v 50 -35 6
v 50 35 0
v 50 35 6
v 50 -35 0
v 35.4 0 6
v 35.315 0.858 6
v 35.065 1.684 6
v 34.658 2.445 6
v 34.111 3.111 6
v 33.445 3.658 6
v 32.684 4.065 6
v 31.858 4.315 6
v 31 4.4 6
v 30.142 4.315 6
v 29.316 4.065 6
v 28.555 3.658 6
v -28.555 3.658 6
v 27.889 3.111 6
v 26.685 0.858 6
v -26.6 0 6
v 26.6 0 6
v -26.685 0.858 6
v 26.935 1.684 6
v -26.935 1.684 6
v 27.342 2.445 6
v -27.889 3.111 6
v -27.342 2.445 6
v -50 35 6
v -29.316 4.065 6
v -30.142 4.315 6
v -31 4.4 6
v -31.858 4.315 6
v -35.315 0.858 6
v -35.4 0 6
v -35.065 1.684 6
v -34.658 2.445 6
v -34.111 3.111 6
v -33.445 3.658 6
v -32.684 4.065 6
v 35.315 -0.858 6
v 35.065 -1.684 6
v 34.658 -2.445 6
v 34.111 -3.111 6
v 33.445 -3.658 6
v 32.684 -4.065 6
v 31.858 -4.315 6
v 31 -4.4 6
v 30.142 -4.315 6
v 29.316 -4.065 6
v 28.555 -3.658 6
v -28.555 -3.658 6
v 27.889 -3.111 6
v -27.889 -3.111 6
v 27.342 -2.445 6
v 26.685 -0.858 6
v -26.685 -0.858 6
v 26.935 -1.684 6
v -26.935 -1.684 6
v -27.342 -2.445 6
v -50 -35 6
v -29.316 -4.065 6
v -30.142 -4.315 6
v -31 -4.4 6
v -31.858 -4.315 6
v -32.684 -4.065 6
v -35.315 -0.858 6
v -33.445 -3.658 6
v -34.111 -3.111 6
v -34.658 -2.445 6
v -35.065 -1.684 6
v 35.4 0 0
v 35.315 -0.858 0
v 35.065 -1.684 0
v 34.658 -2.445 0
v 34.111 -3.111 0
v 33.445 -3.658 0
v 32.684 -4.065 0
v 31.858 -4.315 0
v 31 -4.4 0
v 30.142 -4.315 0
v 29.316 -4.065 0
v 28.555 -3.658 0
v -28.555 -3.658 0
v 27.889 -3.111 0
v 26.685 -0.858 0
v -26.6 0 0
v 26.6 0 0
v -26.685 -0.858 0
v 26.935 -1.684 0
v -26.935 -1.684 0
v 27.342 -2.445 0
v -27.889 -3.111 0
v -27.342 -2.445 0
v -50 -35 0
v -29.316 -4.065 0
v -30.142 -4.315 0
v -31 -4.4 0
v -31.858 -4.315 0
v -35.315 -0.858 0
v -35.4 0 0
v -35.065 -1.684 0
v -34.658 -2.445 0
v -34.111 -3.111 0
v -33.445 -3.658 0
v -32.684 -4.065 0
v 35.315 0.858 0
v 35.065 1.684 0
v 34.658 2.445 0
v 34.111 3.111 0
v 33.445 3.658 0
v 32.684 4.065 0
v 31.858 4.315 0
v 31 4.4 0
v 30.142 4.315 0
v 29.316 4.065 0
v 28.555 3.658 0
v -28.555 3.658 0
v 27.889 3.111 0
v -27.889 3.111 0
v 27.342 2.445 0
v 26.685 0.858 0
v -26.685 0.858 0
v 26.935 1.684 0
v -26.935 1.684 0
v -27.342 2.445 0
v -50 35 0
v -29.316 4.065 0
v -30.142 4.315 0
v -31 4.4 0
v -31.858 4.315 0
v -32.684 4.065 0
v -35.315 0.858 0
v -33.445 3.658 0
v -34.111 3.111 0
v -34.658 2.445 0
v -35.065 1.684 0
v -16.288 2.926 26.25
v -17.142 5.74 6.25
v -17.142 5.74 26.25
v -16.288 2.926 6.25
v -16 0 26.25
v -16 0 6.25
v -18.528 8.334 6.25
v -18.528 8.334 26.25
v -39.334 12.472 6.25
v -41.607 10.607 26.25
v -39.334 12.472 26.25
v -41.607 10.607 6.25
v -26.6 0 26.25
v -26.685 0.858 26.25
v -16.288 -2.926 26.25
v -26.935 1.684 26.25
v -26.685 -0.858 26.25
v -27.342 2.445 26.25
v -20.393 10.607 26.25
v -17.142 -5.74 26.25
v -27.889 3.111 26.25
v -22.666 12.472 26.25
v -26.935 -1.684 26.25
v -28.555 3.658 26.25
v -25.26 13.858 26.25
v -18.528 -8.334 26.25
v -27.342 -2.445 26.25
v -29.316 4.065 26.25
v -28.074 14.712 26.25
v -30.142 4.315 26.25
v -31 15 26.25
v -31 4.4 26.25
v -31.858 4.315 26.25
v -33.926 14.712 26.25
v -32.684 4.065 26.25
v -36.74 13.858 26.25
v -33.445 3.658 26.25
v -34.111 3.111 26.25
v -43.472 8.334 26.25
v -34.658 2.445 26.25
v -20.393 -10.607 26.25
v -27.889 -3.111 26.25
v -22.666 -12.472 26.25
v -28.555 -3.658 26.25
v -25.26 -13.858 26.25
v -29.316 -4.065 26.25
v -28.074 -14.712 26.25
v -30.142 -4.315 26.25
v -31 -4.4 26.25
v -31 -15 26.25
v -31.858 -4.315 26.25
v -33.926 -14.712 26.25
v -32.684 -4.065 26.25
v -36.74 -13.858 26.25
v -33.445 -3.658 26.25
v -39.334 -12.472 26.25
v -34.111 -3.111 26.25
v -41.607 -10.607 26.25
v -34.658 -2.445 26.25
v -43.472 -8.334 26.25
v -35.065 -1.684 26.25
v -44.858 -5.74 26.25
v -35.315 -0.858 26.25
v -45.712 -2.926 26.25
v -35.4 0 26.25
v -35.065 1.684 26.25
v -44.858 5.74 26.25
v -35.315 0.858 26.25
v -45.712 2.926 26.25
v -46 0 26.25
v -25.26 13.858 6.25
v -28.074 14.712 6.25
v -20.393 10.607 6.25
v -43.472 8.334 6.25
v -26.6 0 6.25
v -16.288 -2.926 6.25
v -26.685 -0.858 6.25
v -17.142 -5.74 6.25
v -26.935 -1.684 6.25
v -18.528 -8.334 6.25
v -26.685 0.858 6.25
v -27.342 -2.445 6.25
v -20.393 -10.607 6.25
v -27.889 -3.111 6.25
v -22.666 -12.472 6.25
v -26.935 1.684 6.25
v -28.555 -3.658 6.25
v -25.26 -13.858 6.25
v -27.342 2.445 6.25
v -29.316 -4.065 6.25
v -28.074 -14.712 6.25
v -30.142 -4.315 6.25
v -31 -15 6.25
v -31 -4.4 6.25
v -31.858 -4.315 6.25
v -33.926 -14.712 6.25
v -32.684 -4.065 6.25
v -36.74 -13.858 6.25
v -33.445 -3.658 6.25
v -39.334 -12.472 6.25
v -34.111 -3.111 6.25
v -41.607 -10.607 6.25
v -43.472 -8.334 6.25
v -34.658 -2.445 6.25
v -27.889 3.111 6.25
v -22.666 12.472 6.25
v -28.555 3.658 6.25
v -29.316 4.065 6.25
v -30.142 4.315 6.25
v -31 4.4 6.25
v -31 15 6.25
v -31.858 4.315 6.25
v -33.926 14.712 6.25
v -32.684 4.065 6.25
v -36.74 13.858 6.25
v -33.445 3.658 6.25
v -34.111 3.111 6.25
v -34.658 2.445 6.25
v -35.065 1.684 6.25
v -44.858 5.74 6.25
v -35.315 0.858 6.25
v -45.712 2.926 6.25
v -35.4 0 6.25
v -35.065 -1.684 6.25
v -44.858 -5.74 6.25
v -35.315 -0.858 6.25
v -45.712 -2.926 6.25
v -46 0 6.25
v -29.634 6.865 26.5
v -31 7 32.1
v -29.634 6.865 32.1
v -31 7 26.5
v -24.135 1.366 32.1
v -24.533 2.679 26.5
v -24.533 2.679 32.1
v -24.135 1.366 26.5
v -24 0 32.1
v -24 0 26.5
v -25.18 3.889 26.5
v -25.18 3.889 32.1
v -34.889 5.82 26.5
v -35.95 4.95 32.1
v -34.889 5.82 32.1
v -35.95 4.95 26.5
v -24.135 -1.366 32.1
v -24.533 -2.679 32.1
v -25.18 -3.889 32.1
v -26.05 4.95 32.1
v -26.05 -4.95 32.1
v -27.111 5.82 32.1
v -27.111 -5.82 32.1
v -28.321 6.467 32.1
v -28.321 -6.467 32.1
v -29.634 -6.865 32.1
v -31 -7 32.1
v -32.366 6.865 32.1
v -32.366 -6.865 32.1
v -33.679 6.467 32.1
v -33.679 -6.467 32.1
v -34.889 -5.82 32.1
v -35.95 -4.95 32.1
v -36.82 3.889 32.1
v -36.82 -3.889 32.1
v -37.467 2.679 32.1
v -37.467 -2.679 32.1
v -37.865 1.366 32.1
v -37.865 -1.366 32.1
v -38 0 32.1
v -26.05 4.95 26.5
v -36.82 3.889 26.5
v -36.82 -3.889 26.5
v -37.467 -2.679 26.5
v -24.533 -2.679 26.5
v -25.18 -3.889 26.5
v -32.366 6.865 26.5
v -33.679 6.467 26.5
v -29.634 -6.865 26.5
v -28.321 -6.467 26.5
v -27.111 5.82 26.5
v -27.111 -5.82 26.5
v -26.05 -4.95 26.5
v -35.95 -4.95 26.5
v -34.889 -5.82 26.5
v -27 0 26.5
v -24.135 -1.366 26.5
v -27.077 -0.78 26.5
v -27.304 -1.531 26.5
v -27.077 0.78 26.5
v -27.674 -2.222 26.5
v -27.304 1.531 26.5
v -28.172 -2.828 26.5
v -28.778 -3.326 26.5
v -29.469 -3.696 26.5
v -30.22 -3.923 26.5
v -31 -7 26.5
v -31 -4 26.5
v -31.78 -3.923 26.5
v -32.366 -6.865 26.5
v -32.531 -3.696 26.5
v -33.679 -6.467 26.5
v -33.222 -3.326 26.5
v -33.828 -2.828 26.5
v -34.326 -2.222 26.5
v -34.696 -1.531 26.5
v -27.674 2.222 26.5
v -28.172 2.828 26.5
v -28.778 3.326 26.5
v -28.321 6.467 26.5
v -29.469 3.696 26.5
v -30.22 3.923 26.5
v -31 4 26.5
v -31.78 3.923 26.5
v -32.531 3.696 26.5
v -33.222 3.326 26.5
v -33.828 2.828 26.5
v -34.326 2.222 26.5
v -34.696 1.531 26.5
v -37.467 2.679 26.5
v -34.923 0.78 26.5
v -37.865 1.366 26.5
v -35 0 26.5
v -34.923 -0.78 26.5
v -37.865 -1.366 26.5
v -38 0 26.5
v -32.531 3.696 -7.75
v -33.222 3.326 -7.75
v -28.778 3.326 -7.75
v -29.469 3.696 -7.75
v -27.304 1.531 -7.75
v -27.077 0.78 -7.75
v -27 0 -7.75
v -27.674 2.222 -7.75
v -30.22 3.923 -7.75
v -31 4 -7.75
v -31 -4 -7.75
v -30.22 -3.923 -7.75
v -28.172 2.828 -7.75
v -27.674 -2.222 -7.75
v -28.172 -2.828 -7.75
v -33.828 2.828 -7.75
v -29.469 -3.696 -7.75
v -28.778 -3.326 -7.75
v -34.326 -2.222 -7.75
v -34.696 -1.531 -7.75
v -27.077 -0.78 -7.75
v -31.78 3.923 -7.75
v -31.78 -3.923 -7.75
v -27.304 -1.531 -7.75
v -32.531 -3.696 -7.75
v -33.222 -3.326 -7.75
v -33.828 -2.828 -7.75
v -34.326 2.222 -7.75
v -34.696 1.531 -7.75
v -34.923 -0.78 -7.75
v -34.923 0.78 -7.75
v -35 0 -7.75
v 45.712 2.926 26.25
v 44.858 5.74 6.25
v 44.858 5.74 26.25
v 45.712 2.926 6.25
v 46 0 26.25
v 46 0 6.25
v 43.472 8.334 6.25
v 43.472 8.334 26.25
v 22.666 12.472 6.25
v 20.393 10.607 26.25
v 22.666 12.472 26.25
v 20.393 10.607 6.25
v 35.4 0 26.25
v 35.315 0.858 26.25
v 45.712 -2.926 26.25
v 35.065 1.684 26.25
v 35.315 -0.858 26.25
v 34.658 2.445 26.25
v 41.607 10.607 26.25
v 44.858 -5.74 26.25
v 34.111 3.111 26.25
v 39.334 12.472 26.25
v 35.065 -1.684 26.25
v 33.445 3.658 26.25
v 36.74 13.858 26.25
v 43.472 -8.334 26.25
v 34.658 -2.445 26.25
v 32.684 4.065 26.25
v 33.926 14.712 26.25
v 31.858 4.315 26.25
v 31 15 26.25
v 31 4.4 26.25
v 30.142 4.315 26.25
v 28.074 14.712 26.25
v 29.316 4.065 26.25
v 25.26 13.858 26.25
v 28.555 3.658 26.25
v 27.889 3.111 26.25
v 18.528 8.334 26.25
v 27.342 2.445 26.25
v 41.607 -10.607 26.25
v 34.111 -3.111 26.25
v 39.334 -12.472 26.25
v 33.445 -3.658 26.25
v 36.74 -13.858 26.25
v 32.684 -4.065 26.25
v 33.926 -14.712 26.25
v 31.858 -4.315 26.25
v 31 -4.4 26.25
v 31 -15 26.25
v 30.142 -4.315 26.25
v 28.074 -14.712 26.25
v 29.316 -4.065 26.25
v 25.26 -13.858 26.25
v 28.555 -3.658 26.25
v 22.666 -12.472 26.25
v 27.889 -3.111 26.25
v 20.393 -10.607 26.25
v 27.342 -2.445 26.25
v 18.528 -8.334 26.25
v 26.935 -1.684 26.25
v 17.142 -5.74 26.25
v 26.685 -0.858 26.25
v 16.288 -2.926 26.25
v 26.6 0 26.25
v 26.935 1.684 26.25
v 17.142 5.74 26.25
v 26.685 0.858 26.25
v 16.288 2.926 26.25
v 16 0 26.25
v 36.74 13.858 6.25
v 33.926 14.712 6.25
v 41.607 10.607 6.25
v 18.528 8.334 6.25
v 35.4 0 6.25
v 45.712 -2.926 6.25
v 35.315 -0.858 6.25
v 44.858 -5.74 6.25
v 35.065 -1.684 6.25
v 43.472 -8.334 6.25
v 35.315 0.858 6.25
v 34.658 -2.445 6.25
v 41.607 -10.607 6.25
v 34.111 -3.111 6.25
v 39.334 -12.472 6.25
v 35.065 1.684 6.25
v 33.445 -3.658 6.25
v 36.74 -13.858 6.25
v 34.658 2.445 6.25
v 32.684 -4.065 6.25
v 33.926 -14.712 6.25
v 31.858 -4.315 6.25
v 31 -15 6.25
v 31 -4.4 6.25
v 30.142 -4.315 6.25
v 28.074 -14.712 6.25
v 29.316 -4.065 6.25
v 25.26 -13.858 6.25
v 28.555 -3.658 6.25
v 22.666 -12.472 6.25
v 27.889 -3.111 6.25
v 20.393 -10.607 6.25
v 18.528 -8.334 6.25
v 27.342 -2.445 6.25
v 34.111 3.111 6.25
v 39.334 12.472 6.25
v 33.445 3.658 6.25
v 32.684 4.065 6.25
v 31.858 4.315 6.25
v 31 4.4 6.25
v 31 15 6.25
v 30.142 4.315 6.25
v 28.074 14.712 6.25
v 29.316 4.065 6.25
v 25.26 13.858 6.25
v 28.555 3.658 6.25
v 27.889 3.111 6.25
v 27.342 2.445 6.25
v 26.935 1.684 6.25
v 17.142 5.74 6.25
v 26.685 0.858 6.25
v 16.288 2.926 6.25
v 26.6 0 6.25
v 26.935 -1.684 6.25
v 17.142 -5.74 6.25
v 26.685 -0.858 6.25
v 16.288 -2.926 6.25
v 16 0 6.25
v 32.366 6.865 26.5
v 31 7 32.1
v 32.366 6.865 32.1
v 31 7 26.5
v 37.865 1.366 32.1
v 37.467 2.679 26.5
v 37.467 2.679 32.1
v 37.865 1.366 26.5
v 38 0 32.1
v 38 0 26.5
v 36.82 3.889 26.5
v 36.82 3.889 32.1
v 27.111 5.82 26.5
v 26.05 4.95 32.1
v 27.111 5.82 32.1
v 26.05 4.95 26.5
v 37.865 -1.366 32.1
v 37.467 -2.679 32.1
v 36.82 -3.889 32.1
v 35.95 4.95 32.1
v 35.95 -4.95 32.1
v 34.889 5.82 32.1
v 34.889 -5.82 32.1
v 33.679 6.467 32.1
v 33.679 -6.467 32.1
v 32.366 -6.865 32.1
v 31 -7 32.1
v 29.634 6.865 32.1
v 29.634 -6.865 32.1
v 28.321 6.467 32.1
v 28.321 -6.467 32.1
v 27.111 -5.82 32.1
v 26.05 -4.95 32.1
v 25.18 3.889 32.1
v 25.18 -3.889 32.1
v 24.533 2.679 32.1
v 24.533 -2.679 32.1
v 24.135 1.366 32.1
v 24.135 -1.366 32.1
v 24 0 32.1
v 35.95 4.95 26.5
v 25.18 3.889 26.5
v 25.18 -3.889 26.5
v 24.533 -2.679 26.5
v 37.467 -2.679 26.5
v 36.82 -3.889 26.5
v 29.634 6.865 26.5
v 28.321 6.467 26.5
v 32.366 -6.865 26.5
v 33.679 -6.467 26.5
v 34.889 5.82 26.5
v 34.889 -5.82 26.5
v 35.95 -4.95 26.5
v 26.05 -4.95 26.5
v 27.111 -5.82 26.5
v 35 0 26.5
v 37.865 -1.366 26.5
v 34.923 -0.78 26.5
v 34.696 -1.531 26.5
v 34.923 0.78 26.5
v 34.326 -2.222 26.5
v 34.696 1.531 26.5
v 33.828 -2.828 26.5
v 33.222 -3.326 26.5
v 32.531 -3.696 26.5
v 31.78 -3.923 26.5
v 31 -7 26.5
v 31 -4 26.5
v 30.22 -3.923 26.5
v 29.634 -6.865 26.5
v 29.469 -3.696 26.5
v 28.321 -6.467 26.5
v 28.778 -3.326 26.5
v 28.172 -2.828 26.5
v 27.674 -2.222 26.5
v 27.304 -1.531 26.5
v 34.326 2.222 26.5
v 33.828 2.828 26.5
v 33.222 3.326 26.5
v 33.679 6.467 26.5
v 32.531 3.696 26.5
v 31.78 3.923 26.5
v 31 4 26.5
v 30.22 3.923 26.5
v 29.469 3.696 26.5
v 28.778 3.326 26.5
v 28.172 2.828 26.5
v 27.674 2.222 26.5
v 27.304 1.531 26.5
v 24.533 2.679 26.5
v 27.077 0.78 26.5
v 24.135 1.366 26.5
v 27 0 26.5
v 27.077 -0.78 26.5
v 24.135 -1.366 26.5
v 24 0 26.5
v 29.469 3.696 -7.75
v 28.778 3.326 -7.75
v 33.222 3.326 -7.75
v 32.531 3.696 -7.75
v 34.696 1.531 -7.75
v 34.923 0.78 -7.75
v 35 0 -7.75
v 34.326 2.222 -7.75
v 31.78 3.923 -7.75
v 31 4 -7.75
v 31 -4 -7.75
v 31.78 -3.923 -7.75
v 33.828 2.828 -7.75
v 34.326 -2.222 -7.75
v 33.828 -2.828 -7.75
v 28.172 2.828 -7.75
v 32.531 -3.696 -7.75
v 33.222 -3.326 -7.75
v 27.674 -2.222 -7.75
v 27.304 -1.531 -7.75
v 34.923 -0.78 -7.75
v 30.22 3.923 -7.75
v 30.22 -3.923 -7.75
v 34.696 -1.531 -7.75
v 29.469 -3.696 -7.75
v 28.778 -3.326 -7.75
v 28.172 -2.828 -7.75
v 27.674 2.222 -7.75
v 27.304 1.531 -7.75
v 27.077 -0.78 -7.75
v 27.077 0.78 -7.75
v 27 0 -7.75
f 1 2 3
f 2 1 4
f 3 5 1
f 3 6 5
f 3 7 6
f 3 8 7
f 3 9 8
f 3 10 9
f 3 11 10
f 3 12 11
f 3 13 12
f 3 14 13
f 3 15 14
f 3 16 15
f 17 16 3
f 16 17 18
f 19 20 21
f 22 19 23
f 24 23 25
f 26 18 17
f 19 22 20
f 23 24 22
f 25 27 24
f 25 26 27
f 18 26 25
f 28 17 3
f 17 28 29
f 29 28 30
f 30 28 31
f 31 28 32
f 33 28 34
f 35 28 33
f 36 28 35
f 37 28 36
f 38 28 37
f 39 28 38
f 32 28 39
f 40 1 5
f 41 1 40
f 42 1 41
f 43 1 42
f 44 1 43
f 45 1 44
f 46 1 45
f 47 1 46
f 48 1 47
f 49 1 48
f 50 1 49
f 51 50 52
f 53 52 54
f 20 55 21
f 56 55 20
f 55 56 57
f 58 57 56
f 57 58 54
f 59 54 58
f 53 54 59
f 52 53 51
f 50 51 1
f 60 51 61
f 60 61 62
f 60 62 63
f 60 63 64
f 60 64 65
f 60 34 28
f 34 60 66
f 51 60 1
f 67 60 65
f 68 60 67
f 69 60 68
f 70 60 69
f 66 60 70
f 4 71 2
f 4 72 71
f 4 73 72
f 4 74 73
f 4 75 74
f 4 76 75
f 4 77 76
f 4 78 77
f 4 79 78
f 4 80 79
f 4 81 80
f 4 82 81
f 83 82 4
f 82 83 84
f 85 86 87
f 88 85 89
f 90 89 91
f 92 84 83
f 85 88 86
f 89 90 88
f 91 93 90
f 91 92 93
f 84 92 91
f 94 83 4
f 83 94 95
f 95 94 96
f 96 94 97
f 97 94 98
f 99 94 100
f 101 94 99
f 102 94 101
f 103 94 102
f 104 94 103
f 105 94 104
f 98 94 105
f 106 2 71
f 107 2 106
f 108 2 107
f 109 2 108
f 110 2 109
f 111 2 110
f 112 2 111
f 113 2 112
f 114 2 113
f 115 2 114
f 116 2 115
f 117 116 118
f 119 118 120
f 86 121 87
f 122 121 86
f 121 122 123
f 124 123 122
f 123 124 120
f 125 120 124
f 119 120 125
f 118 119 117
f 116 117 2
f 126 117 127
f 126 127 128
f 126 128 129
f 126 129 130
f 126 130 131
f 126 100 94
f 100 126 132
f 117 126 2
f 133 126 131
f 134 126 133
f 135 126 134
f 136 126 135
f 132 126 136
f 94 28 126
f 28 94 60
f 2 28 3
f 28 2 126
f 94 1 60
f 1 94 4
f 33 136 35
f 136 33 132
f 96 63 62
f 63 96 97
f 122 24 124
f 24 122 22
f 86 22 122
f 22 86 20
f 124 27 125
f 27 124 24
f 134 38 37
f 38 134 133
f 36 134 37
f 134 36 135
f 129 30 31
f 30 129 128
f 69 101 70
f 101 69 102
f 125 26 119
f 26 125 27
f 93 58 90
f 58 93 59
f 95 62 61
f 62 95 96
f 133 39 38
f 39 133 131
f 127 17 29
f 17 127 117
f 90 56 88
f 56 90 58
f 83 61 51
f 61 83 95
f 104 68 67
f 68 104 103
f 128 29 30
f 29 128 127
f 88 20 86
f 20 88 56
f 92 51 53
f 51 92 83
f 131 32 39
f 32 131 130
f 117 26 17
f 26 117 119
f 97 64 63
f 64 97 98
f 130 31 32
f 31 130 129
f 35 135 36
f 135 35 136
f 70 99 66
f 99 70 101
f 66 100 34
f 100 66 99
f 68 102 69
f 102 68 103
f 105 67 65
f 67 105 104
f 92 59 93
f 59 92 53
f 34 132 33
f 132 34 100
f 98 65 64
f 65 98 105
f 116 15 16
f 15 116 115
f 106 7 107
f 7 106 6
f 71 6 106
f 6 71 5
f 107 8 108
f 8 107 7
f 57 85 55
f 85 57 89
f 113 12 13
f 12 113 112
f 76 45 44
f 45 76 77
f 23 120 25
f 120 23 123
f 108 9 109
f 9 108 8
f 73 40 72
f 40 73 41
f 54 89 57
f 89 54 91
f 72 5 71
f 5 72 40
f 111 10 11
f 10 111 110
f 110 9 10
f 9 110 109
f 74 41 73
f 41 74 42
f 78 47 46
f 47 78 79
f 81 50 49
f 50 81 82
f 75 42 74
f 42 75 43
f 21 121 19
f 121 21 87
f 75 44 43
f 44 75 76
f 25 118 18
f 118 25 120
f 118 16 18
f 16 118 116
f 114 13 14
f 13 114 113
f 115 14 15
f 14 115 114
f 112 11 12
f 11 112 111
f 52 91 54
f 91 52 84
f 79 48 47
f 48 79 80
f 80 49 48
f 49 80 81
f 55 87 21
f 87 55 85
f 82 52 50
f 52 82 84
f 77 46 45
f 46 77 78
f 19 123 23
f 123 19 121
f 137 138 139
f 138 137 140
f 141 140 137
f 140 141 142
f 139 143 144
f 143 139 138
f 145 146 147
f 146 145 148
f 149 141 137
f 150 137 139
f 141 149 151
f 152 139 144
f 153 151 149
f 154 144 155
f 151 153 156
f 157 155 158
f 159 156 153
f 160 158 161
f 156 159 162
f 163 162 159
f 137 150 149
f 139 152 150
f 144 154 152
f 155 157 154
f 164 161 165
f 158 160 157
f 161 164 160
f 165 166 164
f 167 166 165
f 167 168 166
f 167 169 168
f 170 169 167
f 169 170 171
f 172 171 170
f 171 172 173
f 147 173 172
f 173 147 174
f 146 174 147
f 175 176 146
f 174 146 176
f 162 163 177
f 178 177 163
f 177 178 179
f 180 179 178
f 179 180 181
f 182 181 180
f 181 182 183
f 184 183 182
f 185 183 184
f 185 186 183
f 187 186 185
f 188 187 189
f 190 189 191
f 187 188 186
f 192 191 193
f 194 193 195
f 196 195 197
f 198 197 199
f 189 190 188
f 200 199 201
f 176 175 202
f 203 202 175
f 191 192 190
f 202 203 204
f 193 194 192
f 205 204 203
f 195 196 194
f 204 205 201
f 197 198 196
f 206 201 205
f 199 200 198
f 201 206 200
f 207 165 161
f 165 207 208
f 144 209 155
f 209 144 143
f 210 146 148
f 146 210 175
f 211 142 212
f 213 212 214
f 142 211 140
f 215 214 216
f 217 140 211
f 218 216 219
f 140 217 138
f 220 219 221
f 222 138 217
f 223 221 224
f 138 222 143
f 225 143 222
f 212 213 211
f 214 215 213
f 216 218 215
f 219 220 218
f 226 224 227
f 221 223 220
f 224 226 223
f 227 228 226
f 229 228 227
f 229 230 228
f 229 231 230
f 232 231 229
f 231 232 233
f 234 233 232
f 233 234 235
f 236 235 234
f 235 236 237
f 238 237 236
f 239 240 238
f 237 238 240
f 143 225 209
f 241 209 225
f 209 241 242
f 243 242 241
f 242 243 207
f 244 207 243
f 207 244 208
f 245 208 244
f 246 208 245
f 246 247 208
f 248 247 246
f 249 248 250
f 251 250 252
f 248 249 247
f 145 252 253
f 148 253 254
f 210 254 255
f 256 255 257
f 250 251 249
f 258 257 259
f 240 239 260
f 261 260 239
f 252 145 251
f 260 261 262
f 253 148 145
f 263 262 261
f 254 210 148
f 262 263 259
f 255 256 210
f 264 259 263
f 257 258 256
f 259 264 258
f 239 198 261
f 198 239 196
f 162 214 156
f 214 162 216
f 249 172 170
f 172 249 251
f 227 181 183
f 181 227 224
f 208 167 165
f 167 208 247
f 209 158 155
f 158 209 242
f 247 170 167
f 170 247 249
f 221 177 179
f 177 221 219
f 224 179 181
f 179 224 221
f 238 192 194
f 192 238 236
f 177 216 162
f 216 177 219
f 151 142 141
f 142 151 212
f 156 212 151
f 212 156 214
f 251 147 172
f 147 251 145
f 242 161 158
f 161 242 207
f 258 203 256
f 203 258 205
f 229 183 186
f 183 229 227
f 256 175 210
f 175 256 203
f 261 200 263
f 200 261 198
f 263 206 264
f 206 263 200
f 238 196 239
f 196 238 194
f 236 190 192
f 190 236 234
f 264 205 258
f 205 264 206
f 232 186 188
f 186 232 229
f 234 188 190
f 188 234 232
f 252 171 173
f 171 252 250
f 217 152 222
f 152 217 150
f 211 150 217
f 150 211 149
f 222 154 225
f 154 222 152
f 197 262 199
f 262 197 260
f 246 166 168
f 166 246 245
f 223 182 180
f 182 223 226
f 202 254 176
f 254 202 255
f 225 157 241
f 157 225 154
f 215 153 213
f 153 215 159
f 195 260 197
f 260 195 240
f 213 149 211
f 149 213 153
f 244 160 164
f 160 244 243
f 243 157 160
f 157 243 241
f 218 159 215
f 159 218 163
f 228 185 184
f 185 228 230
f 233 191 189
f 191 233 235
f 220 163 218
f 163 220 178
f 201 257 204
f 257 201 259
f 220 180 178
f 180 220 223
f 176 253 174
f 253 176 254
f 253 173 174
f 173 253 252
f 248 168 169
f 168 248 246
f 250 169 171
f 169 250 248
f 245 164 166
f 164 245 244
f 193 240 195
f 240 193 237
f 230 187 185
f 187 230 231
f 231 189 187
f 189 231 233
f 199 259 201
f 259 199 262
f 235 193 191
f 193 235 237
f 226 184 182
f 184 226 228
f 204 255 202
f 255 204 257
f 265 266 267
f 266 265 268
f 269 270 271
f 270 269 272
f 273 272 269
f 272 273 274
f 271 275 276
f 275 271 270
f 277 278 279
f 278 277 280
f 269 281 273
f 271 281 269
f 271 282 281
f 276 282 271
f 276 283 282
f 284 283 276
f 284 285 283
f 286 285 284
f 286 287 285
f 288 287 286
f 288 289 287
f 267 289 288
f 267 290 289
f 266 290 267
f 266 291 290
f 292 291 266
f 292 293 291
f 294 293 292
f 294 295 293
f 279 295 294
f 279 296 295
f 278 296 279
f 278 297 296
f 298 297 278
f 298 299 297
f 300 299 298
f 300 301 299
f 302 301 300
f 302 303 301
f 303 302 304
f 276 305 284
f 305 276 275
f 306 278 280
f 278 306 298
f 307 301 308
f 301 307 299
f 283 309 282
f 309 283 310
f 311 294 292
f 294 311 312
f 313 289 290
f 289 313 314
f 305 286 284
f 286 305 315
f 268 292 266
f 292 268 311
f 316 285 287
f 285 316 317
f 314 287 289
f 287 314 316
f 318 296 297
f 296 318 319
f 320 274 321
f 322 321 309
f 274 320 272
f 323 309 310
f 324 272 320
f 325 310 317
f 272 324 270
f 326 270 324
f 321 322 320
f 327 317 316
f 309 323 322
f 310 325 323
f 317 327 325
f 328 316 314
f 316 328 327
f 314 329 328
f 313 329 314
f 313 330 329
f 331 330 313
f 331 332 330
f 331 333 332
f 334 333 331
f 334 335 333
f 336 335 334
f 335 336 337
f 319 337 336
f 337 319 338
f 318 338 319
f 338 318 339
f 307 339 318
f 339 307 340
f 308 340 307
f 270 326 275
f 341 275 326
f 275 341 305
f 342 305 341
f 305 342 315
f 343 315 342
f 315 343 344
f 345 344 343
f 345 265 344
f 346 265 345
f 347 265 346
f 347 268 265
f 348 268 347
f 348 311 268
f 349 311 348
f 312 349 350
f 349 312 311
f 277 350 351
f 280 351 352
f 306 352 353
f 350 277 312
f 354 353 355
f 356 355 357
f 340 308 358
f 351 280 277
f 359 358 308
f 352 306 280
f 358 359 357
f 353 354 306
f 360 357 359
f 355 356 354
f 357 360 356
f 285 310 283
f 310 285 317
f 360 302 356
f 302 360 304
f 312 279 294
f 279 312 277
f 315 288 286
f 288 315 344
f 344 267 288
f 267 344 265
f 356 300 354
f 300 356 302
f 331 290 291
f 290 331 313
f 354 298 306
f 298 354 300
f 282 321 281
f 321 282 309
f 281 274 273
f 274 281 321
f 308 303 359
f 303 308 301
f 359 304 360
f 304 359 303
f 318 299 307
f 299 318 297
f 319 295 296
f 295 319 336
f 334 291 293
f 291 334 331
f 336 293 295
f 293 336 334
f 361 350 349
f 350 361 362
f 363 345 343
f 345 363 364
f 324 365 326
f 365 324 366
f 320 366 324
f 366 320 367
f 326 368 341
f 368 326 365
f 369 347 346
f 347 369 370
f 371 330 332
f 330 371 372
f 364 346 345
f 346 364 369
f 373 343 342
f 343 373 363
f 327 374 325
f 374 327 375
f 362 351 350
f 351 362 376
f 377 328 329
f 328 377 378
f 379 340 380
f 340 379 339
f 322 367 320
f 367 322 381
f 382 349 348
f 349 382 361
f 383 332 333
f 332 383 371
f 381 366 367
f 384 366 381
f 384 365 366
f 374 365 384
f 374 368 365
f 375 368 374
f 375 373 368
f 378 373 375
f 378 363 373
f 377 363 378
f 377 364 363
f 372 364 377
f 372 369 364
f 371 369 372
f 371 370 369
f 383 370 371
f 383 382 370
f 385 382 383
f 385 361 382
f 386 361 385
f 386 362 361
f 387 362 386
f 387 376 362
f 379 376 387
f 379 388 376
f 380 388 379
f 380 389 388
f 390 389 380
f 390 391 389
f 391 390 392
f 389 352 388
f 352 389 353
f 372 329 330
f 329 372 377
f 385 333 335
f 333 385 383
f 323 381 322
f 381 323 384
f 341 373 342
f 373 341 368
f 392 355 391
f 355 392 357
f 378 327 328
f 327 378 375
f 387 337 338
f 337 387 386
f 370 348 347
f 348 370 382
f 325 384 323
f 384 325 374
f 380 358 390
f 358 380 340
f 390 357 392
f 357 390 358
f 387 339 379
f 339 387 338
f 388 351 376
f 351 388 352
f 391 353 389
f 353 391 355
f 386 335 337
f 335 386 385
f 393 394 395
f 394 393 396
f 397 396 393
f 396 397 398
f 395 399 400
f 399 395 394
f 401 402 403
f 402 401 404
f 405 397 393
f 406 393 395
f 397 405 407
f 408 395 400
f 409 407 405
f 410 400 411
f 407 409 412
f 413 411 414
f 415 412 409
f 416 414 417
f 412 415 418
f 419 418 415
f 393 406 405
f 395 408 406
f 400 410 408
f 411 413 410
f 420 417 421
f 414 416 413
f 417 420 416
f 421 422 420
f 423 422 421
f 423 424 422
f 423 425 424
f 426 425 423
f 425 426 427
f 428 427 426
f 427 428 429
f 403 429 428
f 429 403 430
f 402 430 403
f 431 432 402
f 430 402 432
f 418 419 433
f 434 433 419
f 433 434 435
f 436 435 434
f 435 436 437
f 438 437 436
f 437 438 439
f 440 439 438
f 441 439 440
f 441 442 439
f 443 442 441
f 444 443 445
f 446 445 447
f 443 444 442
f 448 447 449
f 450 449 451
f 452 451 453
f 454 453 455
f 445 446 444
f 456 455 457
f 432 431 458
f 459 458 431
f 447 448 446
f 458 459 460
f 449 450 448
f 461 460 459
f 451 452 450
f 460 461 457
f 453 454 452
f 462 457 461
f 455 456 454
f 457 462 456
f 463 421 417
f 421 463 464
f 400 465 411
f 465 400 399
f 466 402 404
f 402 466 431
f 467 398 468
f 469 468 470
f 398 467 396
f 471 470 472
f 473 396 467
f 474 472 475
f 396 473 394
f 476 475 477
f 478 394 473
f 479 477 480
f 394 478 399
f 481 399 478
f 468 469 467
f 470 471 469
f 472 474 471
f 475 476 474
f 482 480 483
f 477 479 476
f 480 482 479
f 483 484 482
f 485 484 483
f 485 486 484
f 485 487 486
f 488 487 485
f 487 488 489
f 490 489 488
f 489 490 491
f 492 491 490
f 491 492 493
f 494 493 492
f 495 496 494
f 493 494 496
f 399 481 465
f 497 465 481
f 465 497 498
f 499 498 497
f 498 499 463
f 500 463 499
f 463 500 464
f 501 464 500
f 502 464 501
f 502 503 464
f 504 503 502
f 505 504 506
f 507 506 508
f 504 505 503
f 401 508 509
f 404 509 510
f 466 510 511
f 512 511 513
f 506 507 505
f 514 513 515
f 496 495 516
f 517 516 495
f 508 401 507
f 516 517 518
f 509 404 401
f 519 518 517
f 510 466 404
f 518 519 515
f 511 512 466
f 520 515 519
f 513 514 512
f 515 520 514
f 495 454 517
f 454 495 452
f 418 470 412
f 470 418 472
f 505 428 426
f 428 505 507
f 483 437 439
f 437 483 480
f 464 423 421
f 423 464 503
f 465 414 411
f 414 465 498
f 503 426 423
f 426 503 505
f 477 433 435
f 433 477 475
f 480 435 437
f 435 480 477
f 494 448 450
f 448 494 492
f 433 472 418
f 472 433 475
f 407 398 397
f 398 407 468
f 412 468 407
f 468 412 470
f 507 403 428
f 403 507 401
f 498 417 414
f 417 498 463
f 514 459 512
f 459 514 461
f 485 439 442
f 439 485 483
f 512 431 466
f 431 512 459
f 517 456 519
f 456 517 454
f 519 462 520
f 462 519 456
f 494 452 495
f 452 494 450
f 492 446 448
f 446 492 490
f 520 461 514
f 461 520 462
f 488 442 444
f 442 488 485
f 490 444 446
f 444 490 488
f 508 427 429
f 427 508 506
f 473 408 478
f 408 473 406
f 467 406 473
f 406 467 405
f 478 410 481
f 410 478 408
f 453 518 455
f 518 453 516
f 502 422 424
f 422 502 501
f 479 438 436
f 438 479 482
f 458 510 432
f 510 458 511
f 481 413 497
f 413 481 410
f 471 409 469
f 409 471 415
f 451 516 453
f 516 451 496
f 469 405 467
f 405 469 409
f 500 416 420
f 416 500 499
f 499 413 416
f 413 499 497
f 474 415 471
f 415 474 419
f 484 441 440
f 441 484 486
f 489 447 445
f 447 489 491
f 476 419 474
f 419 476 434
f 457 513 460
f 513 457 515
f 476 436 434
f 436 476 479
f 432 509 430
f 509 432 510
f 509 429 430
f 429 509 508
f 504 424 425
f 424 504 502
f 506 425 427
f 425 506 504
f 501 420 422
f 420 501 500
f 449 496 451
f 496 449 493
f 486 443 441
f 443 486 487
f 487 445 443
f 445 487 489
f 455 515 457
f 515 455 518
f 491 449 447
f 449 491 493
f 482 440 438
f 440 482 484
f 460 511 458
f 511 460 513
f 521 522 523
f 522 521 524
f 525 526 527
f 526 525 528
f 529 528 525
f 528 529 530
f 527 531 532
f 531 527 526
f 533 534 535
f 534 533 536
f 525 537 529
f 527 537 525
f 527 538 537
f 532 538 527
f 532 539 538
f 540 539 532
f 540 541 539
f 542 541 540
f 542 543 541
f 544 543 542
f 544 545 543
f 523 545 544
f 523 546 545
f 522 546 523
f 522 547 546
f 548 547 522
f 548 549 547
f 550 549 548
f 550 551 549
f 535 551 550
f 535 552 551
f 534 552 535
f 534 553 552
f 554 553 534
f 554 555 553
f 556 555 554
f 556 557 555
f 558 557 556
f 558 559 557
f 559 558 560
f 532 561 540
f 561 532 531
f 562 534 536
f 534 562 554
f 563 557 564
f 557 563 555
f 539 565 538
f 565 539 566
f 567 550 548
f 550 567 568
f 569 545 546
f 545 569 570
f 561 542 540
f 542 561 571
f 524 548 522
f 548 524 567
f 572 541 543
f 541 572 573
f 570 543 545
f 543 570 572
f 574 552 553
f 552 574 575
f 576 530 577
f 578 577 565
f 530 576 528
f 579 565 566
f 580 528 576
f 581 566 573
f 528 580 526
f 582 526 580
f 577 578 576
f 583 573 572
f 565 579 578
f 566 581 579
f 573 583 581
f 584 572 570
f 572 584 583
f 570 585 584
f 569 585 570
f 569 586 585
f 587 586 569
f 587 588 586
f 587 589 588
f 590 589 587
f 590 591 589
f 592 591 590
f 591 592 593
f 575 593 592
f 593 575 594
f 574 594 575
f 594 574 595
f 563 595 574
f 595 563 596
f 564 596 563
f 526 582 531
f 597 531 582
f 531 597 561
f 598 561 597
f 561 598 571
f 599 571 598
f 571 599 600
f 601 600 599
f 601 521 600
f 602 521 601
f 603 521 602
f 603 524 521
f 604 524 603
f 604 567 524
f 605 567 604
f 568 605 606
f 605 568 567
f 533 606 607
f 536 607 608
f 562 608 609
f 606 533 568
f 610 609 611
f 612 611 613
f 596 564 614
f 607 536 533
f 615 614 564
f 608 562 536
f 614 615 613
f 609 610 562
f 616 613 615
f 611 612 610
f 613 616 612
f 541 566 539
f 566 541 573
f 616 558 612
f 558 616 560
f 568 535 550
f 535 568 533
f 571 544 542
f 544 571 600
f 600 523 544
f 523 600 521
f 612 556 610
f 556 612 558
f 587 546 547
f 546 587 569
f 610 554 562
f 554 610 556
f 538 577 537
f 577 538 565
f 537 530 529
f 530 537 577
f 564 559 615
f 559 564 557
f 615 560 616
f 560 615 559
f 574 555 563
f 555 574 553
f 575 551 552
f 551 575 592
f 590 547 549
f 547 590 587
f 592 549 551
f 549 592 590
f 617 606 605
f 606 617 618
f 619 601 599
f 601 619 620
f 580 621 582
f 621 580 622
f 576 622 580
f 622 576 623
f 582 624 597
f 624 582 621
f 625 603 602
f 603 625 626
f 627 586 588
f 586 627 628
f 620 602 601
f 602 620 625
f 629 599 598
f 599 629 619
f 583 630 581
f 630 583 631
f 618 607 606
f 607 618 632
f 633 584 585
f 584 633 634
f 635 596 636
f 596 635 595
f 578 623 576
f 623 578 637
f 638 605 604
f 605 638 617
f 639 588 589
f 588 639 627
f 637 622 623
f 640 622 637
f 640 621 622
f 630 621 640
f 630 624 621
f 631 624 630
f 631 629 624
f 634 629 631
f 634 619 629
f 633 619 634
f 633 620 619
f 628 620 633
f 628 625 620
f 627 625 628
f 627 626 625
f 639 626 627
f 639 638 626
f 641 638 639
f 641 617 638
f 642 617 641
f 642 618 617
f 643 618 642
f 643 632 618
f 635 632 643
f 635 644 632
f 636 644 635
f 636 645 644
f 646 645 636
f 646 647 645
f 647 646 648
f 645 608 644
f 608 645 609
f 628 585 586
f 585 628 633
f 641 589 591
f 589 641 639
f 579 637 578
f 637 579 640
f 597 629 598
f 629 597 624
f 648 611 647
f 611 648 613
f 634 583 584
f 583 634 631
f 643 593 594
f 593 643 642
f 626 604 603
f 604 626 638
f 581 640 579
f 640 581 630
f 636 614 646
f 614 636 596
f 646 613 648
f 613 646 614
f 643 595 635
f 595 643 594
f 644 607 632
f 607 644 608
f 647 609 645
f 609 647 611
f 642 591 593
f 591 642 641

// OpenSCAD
$fn = 32;

// ------------------------------------------------------------------------
// Standoff columns: 2 d30 standoffs, bolts d8
// Every part is its own module, assembly() places them once.
// ------------------------------------------------------------------------

// --- part 1 ---
module base_plate() {
  difference() {
    translate([-50, -35, 0]) cube([100, 70, 6]);
    translate([-31, 0, -1]) cylinder(h = 8, d = 8.8);
    translate([31, 0, -1]) cylinder(h = 8, d = 8.8);
  }
}

// --- part 2 ---
module spacer1() {
  difference() {
      translate([0, 0, 0]) cylinder(h = 20, d = 30);
      translate([0, 0, -1]) cylinder(h = 22, d = 8.8);
    }
}

// --- part 3 ---
module bolt1() {
  cylinder(h = 5.6, d = 14);
  translate([0, 0, -34.25]) cylinder(h = 34.25, d = 8);
}

// --- part 4 ---
module spacer2() {
  difference() {
      translate([0, 0, 0]) cylinder(h = 20, d = 30);
      translate([0, 0, -1]) cylinder(h = 22, d = 8.8);
    }
}

// --- part 5 ---
module bolt2() {
  cylinder(h = 5.6, d = 14);
  translate([0, 0, -34.25]) cylinder(h = 34.25, d = 8);
}

// --- assembly ---
module assembly() {
  translate([0, 0, 0]) rotate([0, 0, 0]) base_plate();
  translate([-31, 0, 6.25]) rotate([0, 0, 0]) spacer1();
  translate([-31, 0, 26.5]) rotate([0, 0, 0]) bolt1();
  translate([31, 0, 6.25]) rotate([0, 0, 0]) spacer2();
  translate([31, 0, 26.5]) rotate([0, 0, 0]) bolt2();
}

assembly();
